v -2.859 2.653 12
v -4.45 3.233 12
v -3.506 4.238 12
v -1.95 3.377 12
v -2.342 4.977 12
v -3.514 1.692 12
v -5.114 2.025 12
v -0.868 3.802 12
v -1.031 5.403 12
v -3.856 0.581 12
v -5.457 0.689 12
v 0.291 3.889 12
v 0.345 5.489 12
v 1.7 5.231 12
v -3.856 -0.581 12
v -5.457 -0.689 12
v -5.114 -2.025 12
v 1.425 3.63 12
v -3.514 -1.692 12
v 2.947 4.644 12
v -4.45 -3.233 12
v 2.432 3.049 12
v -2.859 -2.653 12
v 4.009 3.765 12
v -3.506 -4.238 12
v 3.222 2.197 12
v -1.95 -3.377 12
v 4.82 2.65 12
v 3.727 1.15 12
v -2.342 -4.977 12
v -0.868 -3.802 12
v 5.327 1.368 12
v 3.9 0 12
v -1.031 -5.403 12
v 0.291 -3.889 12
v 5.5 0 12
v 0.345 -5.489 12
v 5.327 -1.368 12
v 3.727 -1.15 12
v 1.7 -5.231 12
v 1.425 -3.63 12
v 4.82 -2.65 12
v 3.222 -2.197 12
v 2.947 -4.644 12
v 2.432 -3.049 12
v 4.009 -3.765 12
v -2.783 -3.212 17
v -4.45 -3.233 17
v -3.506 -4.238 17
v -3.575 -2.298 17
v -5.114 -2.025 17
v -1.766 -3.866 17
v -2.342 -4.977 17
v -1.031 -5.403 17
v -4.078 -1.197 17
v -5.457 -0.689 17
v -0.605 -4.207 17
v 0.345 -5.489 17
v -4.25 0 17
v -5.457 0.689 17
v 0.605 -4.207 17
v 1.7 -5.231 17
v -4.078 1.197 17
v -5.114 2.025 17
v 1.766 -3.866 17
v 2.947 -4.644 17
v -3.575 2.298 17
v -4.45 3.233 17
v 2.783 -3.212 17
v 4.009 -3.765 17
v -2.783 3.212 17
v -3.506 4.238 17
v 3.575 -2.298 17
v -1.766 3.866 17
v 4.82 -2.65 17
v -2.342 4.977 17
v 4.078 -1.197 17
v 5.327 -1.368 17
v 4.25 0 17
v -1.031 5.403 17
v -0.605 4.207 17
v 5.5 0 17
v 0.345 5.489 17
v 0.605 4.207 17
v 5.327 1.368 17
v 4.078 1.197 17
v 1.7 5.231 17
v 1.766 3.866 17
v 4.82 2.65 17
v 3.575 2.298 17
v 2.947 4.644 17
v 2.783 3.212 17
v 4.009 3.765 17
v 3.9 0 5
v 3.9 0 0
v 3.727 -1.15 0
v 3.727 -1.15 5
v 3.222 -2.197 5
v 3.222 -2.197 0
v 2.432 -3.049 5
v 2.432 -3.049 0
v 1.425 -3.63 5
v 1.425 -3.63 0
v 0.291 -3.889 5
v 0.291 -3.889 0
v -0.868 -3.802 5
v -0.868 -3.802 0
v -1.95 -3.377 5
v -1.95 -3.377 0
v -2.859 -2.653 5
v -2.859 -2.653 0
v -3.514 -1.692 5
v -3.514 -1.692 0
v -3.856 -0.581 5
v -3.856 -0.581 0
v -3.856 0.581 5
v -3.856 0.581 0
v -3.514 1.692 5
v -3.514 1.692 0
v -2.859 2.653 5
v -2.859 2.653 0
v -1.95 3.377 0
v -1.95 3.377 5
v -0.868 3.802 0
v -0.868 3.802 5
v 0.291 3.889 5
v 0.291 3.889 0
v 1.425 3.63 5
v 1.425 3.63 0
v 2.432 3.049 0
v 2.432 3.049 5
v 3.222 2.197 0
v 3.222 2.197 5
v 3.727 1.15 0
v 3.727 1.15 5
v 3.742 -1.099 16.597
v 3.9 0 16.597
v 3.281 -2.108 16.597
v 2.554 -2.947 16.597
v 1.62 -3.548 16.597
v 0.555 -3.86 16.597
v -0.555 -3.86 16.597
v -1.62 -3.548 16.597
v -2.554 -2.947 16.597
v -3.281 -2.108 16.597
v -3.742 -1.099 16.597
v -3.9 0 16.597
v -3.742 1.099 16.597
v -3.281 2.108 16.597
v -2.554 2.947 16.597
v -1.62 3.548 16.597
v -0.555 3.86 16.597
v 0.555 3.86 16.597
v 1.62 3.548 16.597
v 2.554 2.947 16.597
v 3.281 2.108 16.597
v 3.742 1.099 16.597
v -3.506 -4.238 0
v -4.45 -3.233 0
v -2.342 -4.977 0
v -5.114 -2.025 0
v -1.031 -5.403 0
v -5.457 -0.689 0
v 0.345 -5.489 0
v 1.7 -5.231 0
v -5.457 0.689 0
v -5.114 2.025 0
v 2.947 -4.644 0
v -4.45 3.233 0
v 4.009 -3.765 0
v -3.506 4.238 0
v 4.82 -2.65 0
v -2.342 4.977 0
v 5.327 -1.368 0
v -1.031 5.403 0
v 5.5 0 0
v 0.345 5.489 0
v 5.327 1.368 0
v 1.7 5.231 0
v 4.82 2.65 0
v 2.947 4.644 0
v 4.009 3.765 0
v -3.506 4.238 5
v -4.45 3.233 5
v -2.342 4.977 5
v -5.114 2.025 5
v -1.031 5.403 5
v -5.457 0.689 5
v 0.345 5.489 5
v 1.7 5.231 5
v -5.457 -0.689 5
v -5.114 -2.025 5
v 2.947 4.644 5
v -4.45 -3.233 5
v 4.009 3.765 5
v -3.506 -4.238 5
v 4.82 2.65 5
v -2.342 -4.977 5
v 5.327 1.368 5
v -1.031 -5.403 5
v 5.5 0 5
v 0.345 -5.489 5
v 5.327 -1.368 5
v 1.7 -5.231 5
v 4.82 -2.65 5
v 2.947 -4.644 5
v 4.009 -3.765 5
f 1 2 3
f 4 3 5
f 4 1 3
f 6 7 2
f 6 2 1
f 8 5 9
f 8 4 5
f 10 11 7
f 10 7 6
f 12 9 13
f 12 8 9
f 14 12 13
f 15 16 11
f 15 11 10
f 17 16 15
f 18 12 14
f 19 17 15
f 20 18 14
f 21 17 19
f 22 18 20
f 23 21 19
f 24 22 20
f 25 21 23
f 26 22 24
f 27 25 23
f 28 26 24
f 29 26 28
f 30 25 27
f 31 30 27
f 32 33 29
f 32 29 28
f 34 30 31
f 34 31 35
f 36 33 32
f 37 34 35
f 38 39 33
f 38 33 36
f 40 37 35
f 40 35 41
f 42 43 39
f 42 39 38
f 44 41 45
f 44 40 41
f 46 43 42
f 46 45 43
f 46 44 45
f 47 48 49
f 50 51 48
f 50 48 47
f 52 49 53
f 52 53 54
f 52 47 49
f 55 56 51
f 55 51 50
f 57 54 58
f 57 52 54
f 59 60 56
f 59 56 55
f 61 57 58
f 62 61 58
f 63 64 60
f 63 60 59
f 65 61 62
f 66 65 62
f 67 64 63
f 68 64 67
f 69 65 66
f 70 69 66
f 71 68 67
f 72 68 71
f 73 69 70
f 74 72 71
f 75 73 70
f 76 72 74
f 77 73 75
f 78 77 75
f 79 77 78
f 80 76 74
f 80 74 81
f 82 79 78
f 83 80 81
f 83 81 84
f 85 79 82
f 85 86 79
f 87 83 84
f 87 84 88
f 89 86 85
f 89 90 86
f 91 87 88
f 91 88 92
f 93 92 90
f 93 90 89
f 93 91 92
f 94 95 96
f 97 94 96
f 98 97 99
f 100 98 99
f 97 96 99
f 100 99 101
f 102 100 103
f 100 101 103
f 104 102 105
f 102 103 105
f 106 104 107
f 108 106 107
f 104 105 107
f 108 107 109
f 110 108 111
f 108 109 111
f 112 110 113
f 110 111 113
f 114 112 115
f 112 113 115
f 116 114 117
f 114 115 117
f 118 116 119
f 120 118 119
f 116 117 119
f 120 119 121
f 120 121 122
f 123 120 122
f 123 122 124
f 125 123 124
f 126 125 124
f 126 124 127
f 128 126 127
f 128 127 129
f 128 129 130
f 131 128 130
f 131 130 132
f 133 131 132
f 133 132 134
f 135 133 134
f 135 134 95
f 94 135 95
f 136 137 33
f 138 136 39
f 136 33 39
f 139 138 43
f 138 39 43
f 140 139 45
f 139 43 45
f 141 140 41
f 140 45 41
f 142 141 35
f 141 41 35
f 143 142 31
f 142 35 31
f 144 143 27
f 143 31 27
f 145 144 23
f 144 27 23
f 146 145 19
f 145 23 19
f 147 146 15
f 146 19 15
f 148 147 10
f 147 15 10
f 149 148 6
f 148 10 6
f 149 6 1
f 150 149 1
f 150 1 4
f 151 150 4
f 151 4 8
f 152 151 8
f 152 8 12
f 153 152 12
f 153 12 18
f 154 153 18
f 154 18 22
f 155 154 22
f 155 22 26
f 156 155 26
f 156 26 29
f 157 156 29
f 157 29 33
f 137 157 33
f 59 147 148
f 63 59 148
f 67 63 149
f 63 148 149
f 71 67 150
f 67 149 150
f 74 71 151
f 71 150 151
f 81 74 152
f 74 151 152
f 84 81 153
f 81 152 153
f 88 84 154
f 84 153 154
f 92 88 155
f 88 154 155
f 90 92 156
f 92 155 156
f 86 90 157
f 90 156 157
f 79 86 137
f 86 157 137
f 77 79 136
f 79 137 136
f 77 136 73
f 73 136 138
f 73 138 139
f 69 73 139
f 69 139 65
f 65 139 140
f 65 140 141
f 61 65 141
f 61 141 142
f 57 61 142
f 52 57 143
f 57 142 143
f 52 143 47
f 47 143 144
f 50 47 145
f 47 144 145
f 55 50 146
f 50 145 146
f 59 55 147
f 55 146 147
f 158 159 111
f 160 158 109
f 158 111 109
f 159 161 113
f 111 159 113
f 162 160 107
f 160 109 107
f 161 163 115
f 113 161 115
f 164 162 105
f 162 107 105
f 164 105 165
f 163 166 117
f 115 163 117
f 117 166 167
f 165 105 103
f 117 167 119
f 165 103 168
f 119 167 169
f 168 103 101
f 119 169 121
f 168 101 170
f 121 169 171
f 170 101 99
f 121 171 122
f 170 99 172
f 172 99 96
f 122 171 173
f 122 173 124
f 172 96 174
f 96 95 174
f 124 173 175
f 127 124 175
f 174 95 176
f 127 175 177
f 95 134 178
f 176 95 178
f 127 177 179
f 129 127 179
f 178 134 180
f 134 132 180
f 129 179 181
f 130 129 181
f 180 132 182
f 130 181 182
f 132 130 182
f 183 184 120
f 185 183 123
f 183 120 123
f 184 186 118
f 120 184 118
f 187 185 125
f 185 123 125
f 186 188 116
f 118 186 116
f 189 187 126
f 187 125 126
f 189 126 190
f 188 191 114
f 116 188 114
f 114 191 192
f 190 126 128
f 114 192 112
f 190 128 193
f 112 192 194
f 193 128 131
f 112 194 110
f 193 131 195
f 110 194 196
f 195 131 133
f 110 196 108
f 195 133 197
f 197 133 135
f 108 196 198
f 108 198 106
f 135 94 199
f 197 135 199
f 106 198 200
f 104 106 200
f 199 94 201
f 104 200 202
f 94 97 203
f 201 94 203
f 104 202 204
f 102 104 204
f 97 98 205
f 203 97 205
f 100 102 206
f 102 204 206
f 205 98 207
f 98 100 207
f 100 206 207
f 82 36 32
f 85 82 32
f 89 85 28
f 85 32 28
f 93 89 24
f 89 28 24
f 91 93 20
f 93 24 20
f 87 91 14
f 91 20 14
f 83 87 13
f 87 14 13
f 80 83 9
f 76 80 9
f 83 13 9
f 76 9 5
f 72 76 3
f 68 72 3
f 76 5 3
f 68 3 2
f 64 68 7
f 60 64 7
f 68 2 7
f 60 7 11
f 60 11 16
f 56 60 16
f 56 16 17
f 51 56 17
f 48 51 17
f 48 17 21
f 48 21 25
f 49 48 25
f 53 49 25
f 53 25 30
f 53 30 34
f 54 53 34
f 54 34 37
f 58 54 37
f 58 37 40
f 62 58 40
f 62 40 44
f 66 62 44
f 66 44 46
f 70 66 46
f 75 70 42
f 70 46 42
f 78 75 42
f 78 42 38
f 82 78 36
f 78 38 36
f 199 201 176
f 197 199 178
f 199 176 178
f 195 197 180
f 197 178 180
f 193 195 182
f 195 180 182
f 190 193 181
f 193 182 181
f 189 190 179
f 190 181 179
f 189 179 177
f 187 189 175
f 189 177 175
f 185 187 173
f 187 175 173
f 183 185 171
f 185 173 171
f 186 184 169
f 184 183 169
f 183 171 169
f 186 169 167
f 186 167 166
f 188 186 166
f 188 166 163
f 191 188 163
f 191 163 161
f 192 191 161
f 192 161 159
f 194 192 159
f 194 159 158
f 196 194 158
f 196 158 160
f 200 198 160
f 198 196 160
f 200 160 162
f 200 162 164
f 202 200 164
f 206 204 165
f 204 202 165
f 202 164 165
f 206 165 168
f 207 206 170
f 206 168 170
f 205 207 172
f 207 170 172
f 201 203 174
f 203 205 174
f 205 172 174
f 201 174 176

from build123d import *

# Parameters (mm, degrees)
F0_R           = 5.5
F1_DEPTH       = 17
F3_R           = 5.5
F3_R_2         = 3.9
F4_DEPTH       = 7
F6_R           = 3.9
F7_DEPTH       = 0.1
F9_D           = 4.5
F9_CSINK_D     = 8.5
F9_CSINK_ANGLE = 82
F10_R          = 3.9
F11_DEPTH      = 17.001


with BuildPart() as f1:
    # F0 (on Top) → F1 (new body)
    with BuildSketch(Plane.XY):
        Circle(F0_R)
    extrude(amount=F1_DEPTH)

    # F3 (on offset) → F4 (cut)
    with BuildSketch(Plane(origin=(0, 0, 5), x_dir=(1, 0, 0), z_dir=(0, 0, -1))):
        Circle(F3_R)
        Circle(F3_R_2, mode=Mode.SUBTRACT)
    extrude(amount=-F4_DEPTH, mode=Mode.SUBTRACT)

    # F6 (on offset) → F7 (cut)
    with BuildSketch(Plane.XY.offset(8.5)):
        Circle(F6_R)
    extrude(amount=F7_DEPTH, mode=Mode.SUBTRACT)

    # F9 (through all)
    with Locations(Plane.XY.offset(17)):
        with Locations((0, 0)):
            CounterSinkHole(F9_D / 2, F9_CSINK_D / 2, counter_sink_angle=F9_CSINK_ANGLE)

    # F10 (on face) → F11 (cut, through all)
    with BuildSketch(Plane(origin=(0, 0, 0), x_dir=(1, 0, 0), z_dir=(0, 0, -1))):
        Circle(F10_R)
    extrude(amount=-F11_DEPTH, mode=Mode.SUBTRACT)


solid = f1.part
